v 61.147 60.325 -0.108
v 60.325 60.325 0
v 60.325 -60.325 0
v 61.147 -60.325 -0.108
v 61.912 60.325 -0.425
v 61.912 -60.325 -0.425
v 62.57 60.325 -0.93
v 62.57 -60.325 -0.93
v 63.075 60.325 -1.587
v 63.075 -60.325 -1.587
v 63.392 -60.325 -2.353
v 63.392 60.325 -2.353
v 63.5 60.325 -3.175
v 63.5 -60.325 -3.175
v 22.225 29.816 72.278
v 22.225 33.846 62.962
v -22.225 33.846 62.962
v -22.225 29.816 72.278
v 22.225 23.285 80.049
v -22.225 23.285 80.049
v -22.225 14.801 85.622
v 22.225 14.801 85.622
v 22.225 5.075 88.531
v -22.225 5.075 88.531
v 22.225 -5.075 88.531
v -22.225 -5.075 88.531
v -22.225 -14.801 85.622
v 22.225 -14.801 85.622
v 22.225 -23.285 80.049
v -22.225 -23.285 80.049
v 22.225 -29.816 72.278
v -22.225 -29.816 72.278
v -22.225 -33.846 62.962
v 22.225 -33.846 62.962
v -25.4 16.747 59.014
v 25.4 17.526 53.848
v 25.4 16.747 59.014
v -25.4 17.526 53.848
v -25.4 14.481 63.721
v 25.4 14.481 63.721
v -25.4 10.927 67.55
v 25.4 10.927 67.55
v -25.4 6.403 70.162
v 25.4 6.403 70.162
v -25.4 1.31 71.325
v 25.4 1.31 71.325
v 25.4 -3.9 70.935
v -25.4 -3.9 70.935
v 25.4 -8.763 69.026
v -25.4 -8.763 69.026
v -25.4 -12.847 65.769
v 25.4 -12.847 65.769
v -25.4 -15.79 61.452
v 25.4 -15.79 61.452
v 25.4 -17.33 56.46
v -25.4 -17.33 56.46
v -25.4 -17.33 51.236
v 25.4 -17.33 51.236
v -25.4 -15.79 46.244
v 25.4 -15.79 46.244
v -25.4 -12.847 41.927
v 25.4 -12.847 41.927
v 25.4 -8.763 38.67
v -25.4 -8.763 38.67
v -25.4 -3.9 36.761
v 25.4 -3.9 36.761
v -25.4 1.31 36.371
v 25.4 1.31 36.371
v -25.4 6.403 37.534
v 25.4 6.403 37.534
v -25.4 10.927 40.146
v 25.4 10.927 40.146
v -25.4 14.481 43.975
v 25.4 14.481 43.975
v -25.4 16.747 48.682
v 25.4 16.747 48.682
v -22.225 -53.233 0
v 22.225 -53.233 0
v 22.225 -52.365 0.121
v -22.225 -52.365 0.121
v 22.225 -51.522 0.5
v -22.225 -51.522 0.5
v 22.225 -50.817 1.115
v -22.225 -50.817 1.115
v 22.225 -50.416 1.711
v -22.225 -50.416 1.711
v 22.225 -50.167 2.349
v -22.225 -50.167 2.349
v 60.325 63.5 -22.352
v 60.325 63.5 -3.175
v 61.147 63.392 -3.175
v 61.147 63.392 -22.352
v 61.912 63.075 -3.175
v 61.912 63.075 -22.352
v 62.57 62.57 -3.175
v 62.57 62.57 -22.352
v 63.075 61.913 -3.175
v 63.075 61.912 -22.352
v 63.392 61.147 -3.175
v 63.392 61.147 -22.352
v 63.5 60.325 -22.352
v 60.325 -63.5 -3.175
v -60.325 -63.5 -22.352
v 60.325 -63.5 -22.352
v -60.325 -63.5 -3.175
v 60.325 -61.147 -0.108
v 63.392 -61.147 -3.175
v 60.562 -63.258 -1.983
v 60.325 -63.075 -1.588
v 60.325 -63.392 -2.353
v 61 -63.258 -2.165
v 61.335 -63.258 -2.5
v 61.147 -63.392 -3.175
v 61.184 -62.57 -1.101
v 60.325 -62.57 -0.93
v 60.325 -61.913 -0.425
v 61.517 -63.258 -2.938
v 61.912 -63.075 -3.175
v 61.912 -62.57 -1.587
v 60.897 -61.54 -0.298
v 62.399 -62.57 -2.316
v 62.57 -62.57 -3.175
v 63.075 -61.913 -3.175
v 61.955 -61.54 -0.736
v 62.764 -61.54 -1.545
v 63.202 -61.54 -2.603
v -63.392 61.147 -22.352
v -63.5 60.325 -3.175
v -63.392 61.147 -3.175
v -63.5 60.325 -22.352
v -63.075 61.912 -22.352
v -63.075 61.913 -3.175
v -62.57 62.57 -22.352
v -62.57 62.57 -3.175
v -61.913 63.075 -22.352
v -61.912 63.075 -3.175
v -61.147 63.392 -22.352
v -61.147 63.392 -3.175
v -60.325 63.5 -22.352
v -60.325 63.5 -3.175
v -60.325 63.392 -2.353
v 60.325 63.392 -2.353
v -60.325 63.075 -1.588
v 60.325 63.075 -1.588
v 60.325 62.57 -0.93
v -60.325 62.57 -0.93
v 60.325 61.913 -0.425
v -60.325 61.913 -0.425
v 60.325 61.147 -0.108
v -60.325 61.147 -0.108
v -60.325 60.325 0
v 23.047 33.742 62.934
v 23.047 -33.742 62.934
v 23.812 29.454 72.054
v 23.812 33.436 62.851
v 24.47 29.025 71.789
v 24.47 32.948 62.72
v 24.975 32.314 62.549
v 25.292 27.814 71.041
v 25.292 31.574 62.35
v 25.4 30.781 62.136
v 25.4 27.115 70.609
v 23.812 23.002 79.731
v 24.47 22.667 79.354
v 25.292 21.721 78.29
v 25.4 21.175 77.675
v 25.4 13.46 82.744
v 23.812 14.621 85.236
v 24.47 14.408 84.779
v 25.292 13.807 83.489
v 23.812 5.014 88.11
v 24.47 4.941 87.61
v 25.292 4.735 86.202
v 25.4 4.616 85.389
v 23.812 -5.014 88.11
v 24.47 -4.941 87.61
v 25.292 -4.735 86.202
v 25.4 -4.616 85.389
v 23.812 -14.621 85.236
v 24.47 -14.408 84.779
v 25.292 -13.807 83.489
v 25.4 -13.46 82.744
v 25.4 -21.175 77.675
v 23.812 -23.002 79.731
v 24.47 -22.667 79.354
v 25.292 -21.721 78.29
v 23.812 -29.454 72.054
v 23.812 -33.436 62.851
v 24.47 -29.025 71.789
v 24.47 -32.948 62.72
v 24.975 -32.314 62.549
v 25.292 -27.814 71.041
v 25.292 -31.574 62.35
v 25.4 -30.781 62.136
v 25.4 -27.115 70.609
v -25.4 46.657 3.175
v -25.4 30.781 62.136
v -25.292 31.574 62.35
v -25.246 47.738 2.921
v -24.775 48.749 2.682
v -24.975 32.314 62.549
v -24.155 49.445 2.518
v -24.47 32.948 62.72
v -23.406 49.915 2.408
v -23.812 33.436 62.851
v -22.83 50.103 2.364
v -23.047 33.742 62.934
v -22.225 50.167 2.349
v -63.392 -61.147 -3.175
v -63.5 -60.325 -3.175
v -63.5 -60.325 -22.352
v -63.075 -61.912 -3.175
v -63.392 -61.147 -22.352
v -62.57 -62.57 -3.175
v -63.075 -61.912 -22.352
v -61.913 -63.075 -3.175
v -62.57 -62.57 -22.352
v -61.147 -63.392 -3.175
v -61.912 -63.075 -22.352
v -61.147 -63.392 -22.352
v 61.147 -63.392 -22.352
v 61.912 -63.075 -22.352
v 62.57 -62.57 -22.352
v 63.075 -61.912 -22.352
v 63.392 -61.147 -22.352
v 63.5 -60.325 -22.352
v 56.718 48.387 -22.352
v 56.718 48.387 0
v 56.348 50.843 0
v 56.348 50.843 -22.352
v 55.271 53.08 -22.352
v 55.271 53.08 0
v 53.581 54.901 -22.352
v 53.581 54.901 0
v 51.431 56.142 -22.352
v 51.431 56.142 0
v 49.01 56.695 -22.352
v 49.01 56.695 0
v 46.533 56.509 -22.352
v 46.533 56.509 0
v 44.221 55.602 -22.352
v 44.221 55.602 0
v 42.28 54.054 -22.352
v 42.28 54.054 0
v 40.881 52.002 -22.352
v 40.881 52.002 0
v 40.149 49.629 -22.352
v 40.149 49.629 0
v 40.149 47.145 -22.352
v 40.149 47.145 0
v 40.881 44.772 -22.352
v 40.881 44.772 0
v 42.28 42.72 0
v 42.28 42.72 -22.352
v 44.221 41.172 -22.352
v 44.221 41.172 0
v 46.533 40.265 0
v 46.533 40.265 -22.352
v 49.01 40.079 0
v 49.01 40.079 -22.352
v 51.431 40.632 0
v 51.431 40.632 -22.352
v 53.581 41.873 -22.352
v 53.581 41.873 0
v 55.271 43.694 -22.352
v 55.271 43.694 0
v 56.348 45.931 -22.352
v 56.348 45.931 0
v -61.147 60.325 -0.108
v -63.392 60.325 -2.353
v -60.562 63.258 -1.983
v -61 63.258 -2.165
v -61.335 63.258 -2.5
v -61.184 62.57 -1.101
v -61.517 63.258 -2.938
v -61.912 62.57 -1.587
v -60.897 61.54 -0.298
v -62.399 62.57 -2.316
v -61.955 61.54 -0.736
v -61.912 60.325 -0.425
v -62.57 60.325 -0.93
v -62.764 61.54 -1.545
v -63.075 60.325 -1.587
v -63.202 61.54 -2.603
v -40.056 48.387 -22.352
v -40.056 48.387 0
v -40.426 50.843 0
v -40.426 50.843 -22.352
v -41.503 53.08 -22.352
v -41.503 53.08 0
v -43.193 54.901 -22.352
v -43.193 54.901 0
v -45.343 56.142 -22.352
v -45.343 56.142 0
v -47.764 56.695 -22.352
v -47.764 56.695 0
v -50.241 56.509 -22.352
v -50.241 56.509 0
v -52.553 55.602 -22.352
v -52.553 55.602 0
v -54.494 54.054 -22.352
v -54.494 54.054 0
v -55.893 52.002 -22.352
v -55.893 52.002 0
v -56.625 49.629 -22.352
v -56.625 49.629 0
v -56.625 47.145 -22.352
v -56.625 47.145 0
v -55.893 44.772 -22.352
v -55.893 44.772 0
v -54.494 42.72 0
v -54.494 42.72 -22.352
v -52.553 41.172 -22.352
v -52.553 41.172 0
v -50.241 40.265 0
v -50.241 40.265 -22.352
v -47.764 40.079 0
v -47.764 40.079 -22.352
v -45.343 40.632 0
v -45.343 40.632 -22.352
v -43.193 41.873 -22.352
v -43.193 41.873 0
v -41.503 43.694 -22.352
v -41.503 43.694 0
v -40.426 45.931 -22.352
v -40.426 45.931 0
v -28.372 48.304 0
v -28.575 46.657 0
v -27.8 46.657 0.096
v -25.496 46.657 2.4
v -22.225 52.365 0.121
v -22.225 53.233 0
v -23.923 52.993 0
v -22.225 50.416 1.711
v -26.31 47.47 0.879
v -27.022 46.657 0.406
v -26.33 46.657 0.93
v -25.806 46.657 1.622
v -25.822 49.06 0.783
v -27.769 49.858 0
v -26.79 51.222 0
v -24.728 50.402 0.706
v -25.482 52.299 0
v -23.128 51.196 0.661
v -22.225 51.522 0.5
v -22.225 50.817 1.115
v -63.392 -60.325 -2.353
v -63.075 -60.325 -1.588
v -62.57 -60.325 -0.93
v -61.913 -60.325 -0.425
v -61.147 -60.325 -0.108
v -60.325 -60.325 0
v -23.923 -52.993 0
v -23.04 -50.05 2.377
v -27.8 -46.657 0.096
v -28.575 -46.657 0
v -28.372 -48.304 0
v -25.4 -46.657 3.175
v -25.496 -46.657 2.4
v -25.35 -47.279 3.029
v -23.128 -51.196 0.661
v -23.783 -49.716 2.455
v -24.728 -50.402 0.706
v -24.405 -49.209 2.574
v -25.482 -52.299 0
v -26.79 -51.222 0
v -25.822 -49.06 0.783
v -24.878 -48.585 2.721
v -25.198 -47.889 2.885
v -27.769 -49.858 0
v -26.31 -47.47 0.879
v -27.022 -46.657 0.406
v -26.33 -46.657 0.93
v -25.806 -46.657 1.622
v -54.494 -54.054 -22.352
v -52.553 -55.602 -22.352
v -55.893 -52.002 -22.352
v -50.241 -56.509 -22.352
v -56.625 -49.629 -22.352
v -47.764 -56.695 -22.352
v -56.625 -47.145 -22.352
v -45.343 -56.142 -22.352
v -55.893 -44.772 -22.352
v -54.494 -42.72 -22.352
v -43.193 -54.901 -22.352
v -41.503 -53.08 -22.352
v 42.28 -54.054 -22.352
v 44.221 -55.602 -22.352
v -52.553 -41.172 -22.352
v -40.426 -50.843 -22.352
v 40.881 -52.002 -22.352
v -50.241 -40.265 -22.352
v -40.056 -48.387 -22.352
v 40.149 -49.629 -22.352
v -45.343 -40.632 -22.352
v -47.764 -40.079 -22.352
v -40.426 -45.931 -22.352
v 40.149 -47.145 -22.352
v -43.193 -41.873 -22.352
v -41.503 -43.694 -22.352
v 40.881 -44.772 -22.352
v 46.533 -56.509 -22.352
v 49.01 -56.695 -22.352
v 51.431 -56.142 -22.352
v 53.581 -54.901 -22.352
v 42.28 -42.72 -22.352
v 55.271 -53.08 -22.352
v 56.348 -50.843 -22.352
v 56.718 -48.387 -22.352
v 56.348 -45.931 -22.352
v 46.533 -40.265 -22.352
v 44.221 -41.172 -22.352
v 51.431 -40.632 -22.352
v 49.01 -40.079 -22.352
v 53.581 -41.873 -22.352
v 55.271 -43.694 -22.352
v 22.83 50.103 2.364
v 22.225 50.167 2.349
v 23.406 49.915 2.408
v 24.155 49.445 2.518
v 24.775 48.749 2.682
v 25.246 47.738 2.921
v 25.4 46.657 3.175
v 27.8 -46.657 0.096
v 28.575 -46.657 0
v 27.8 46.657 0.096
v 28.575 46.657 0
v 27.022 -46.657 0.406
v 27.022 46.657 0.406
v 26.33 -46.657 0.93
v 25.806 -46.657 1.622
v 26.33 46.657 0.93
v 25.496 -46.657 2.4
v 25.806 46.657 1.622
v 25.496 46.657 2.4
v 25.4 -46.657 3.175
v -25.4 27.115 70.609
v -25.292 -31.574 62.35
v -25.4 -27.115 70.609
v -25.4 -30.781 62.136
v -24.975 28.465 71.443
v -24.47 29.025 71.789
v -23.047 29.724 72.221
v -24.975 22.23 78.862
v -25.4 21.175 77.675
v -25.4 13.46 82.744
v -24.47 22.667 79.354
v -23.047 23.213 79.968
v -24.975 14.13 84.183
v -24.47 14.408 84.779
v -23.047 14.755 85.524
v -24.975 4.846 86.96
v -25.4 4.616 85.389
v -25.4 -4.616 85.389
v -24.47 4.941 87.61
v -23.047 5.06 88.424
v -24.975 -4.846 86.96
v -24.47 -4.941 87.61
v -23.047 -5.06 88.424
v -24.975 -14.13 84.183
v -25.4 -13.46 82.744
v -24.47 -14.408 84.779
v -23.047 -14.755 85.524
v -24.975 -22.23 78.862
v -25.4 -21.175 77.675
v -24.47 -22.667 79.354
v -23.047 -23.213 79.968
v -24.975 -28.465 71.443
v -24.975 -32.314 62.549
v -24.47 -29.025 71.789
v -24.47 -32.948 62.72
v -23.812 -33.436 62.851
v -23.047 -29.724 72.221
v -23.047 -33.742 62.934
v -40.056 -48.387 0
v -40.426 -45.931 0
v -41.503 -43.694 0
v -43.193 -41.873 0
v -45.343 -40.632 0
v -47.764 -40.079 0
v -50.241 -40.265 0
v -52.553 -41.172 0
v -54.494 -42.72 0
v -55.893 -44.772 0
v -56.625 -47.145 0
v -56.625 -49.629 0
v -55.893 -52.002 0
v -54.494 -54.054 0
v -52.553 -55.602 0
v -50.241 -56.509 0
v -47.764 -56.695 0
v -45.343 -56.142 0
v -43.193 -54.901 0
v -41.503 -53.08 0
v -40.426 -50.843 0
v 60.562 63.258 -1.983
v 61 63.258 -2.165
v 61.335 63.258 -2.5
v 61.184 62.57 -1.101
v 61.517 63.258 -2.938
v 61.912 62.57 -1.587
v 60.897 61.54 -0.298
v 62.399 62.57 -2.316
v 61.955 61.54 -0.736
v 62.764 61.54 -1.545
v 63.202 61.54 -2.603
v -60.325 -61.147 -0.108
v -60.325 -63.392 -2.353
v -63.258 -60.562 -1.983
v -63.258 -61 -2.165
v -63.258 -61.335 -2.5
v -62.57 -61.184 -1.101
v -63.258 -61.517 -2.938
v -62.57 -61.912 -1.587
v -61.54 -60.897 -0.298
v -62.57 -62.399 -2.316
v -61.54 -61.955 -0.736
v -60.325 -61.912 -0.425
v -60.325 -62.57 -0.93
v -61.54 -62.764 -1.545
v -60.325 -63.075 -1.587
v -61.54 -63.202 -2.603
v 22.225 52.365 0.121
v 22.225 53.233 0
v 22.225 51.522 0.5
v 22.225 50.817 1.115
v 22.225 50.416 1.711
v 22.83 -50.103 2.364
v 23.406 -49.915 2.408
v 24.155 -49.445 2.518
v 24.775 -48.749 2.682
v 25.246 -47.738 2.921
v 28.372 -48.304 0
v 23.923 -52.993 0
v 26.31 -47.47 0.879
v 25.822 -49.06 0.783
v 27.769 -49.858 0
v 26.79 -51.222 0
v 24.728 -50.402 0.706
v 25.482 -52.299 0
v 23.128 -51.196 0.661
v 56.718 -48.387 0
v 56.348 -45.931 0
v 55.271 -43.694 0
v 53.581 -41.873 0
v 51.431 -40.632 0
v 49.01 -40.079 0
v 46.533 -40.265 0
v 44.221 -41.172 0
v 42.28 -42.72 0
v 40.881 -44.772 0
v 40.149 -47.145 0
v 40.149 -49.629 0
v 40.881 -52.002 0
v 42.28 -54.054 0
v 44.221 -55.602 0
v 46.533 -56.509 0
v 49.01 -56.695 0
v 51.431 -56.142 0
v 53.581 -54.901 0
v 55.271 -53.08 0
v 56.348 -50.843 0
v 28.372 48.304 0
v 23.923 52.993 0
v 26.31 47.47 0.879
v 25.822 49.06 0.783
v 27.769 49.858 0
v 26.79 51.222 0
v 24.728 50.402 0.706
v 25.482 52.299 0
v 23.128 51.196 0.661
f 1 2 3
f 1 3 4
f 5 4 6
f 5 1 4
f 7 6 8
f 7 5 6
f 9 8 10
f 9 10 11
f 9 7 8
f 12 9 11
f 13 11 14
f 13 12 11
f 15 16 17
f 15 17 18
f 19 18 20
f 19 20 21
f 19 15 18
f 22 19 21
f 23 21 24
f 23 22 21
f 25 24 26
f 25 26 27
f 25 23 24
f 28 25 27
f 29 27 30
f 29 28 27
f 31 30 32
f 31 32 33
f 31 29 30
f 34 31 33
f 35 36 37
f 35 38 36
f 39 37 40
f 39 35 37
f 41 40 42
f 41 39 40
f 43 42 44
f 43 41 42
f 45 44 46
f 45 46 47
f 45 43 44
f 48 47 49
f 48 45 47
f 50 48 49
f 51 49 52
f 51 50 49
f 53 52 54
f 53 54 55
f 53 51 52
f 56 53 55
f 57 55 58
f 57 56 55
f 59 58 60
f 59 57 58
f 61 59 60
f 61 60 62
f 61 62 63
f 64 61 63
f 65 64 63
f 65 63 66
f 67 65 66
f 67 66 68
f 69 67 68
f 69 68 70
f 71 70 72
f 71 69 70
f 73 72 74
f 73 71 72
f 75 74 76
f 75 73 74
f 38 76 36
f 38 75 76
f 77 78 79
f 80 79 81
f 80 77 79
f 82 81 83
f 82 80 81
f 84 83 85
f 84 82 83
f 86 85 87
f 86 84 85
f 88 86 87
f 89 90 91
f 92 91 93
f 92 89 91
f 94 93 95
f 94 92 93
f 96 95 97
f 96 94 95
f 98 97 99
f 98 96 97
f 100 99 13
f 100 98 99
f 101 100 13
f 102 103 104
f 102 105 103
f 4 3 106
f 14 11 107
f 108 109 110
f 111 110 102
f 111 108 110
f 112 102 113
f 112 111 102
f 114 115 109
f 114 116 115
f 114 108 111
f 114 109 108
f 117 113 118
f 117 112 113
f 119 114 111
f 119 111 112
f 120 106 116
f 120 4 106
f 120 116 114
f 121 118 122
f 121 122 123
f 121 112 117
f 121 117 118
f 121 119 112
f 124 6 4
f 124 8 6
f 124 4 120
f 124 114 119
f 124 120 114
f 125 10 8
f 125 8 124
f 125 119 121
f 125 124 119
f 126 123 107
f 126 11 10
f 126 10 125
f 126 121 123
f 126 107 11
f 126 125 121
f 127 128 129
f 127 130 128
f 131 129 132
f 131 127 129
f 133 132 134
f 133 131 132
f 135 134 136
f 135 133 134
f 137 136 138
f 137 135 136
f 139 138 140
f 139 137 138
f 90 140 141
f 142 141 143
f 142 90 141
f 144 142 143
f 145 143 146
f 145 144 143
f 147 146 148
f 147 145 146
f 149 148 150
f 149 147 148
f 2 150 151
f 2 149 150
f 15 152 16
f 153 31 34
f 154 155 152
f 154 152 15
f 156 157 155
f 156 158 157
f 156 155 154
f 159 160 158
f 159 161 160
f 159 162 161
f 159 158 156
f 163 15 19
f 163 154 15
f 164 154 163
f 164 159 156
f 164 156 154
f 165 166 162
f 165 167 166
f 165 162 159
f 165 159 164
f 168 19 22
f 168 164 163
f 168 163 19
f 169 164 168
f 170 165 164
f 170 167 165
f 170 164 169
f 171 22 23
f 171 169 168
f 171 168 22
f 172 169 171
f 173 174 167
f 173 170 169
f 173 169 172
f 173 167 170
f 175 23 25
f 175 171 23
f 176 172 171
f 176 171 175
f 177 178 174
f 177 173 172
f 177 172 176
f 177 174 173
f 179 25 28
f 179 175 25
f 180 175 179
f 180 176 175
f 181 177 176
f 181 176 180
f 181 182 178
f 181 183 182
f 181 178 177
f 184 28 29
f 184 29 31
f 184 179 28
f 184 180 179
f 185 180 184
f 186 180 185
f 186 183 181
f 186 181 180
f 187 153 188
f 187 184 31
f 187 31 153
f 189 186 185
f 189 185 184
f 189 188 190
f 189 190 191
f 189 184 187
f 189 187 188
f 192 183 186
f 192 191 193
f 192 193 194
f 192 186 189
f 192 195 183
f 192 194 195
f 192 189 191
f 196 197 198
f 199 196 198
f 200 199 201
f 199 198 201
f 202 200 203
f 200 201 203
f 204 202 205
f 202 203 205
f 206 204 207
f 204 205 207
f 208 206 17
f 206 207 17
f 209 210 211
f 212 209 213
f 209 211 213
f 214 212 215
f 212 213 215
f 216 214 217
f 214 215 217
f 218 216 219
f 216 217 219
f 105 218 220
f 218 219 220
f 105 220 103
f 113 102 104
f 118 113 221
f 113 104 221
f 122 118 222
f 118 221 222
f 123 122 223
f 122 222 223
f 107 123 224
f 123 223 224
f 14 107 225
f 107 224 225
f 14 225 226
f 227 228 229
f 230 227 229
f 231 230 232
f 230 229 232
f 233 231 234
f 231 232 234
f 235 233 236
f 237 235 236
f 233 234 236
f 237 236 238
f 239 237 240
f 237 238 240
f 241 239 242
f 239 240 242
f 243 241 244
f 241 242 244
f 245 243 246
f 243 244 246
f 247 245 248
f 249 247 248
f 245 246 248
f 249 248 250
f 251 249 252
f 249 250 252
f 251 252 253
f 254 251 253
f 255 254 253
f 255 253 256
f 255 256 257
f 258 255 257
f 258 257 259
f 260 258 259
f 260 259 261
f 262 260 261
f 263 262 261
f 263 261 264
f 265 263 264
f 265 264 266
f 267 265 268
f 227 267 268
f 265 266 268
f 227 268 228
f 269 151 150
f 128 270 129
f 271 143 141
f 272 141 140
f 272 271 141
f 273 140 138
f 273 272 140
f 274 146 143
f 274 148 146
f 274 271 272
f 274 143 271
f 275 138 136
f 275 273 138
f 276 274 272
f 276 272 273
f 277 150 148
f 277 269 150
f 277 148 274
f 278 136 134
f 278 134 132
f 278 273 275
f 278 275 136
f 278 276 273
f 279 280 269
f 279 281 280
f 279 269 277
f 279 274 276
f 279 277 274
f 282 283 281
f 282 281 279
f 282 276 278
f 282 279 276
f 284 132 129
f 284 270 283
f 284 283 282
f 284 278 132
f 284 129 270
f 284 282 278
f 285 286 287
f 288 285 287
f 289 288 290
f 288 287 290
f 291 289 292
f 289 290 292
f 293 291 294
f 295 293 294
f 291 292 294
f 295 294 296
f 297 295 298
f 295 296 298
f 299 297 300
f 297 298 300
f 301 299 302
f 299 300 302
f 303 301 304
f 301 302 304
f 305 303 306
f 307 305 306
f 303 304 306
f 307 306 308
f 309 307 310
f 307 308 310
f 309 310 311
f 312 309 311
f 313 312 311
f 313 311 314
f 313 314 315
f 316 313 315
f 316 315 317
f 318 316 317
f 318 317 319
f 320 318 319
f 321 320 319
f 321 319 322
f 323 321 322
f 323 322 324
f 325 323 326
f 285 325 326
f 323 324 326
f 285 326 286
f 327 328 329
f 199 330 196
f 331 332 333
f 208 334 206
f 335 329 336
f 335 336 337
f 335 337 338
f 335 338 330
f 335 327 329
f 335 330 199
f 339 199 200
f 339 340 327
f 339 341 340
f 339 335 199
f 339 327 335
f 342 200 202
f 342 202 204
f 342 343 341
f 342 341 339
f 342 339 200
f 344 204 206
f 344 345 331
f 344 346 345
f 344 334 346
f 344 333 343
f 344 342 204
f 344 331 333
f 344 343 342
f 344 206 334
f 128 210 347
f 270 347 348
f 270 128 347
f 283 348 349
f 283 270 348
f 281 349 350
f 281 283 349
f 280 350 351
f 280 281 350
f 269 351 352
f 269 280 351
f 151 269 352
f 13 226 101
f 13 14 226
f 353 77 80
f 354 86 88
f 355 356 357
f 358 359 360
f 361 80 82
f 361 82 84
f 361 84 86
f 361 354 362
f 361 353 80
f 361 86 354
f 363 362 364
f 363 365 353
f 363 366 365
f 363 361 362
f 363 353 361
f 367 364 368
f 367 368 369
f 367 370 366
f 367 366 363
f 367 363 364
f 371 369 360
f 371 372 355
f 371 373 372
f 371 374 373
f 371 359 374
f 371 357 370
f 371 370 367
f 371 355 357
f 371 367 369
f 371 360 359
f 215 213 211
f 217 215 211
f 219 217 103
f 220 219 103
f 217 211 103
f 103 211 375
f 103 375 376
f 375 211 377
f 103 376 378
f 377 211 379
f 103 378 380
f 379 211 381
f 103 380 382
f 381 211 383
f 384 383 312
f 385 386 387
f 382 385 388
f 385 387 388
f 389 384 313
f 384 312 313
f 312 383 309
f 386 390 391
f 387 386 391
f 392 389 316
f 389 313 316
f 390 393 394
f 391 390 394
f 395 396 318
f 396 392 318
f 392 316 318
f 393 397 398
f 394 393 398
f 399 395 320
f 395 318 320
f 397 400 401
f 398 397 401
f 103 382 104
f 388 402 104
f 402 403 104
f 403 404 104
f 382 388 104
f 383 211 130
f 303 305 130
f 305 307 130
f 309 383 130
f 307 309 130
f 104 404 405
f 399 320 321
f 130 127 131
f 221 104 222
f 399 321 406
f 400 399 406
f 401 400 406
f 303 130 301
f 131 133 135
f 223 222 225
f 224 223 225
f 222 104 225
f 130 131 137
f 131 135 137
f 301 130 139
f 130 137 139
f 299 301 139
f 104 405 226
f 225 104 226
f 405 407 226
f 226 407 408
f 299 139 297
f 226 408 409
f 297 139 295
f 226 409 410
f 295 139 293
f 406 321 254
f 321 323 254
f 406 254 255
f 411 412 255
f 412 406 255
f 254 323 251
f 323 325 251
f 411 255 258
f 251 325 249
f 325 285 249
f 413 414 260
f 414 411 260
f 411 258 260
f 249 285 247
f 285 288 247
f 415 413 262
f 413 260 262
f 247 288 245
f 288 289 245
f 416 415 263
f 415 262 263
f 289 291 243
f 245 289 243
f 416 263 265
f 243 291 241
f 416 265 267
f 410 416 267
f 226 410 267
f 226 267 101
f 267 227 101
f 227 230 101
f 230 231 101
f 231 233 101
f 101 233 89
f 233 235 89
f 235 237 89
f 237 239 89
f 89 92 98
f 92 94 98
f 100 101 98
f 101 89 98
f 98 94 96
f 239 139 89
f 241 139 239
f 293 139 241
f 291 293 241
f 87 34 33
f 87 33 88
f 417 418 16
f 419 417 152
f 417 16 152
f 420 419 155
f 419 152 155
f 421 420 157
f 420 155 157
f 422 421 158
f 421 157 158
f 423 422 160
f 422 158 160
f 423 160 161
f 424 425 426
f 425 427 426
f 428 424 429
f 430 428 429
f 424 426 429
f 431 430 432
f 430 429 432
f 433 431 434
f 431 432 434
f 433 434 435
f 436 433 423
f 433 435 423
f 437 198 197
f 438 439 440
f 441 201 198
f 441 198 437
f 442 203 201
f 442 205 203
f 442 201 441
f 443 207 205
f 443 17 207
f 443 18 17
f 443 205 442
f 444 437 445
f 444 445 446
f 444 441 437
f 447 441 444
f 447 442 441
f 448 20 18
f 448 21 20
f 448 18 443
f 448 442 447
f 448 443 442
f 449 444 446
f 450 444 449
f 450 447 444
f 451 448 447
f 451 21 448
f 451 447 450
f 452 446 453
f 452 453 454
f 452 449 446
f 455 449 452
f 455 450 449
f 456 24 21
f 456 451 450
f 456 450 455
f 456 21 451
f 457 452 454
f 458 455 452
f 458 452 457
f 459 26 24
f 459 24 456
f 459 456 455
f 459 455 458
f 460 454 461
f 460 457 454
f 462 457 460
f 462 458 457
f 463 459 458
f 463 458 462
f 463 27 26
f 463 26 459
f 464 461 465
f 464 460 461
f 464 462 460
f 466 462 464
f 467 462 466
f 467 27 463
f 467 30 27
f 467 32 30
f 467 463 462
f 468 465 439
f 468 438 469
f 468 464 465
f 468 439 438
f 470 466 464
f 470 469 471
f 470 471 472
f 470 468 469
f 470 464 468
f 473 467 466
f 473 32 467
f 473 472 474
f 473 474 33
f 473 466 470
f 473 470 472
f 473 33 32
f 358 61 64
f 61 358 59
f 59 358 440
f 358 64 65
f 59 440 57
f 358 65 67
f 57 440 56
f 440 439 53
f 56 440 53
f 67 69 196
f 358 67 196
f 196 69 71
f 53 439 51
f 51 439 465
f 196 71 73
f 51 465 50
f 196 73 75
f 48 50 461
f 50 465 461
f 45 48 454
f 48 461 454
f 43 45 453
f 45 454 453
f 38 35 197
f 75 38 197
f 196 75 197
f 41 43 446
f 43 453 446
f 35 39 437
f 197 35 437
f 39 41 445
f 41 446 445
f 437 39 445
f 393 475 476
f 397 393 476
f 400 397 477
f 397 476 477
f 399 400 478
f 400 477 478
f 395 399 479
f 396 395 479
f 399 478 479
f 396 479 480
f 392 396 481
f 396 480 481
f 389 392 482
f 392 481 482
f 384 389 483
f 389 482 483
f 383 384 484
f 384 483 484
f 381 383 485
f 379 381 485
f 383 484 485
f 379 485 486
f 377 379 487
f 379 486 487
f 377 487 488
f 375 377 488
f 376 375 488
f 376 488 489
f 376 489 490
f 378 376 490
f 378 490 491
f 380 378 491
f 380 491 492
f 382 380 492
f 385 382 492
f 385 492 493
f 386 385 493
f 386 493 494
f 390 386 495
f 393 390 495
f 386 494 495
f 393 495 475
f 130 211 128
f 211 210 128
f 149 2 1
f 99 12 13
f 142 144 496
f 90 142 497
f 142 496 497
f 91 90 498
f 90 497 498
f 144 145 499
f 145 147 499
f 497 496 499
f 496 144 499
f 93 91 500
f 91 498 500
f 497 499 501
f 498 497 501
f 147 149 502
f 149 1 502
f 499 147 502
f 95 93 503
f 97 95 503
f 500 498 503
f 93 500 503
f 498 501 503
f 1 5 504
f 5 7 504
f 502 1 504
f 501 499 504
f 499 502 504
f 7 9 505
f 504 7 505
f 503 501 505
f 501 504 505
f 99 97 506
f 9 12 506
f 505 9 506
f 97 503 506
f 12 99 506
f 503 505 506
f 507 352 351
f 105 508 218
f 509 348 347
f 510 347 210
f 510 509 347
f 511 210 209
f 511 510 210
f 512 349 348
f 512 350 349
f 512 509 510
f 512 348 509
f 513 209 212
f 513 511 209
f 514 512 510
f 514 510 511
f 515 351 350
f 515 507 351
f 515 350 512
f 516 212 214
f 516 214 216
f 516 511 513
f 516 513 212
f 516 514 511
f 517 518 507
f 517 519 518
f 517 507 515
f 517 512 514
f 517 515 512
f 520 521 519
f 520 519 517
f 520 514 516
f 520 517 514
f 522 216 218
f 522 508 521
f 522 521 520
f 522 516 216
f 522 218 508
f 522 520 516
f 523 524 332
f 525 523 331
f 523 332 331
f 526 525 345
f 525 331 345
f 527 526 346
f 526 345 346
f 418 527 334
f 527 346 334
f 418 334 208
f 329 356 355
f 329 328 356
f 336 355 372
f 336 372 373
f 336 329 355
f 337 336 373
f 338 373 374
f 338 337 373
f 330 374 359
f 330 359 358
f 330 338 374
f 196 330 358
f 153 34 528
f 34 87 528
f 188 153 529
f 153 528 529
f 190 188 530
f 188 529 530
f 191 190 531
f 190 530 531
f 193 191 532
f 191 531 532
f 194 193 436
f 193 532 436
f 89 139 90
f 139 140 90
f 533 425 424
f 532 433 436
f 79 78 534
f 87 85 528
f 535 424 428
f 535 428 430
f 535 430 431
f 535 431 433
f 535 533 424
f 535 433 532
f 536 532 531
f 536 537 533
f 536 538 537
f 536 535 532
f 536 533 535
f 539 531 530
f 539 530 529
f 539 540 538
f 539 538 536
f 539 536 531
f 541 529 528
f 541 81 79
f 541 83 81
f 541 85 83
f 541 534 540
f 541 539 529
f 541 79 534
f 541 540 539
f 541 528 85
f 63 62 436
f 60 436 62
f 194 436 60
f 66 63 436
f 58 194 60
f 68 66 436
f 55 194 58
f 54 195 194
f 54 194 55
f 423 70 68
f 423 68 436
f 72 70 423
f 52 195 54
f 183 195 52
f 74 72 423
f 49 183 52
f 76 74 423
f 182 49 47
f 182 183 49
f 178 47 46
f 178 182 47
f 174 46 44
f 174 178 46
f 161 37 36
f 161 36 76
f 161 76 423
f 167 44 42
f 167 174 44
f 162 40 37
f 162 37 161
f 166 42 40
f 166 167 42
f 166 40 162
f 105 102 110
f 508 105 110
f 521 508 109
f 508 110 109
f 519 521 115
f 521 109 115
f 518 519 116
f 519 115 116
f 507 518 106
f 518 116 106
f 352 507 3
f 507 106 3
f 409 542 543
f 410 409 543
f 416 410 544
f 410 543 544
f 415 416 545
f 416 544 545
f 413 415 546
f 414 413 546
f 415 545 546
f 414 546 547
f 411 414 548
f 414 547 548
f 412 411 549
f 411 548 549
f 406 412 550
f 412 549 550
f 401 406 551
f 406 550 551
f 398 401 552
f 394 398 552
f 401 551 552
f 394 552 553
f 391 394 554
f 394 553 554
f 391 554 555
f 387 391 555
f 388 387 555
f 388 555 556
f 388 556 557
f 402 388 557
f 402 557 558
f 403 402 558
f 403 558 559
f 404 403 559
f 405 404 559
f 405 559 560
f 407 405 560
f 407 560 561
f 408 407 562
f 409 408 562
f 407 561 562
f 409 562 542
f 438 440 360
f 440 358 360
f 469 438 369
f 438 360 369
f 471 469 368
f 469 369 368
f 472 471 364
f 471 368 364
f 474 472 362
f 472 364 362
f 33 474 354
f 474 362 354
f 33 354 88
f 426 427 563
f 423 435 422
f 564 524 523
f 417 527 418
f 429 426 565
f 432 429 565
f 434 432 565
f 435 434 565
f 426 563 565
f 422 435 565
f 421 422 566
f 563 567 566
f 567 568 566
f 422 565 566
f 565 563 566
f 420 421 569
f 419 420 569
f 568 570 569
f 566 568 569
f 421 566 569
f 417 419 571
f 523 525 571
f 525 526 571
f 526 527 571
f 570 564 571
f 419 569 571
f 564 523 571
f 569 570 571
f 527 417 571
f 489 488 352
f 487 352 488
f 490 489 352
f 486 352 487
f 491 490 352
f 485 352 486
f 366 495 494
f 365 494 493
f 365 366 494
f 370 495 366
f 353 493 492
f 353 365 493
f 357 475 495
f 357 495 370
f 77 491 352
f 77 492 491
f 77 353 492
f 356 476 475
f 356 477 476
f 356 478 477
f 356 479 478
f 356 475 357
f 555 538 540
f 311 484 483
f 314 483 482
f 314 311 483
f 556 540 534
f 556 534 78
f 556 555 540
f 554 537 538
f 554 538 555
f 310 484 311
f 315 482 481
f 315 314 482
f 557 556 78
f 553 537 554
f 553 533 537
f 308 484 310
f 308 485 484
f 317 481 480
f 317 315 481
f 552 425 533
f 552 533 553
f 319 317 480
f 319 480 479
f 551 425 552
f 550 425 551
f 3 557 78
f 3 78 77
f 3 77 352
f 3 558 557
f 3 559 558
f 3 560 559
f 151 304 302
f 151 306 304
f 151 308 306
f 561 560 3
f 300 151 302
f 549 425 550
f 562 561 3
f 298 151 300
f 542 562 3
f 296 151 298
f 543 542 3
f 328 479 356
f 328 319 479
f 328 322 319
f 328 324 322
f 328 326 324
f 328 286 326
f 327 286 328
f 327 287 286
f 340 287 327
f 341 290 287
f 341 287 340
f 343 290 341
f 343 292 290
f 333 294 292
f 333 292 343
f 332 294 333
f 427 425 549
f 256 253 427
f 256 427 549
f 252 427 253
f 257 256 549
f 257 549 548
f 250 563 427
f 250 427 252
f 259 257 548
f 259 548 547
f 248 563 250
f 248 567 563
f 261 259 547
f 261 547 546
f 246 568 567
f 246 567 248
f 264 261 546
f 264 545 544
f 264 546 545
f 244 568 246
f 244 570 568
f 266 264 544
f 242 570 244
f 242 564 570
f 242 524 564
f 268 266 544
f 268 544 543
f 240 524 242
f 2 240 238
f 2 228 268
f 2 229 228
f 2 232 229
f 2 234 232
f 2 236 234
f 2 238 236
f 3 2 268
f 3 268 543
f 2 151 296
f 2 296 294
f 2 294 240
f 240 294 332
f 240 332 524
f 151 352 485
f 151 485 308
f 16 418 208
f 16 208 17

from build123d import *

# Parameters (mm, degrees)
F0_W     = 127
F0_H     = 127
F0_R     = 8.3312
F1_DEPTH = 22.352
F2_R     = 17.526
F3_DEPTH = 25.4
F4_R     = 3.175


with BuildPart() as f1:
    # F0 (on Top) → F1 (new body)
    with BuildSketch(Plane.XY):
        Rectangle(F0_W, F0_H)
        with Locations((-48.387, -48.387)):
            Circle(F0_R, mode=Mode.SUBTRACT)
        with Locations((48.387, -48.387)):
            Circle(F0_R, mode=Mode.SUBTRACT)
        with Locations((-48.387, 48.387)):
            Circle(F0_R, mode=Mode.SUBTRACT)
        with Locations((48.387, 48.387)):
            Circle(F0_R, mode=Mode.SUBTRACT)
    extrude(amount=-F1_DEPTH)

    # F2 (on Right) → F3 (join, symmetric)
    with BuildSketch(Plane.YZ):
        with BuildLine():
            Line((50.8, 0), (33.846452, 62.961747))
            ThreePointArc((33.846452, 62.961747), (0, 88.9), (-33.846452, 62.961747))
            Line((-33.846452, 62.961747), (-50.8, 0))
            Line((-50.8, 0), (50.8, 0))
        make_face()
        with Locations((0, 53.848)):
            Circle(F2_R, mode=Mode.SUBTRACT)
    extrude(amount=F3_DEPTH, both=True)

    # F4
    f4_edges = [f1.edges().sort_by_distance(p)[0] for p in [
        (25.4, 0, 0),
        (0, -50.8, 0),
        (-25.4, 0, 0),
        (0, 50.8, 0),
        (63.5, 0, 0),
        (0, -63.5, 0),
        (-63.5, 0, 0),
        (0, 63.5, 0),
        (25.4, -42.323226, 31.480874),
        (-25.4, -42.323226, 31.480874),
        (63.5, -63.5, -11.176),
        (63.5, 63.5, -11.176),
        (-63.5, -63.5, -11.176),
        (-63.5, 63.5, -11.176),
    ]]
    fillet(f4_edges, radius=F4_R)


solid = f1.part
